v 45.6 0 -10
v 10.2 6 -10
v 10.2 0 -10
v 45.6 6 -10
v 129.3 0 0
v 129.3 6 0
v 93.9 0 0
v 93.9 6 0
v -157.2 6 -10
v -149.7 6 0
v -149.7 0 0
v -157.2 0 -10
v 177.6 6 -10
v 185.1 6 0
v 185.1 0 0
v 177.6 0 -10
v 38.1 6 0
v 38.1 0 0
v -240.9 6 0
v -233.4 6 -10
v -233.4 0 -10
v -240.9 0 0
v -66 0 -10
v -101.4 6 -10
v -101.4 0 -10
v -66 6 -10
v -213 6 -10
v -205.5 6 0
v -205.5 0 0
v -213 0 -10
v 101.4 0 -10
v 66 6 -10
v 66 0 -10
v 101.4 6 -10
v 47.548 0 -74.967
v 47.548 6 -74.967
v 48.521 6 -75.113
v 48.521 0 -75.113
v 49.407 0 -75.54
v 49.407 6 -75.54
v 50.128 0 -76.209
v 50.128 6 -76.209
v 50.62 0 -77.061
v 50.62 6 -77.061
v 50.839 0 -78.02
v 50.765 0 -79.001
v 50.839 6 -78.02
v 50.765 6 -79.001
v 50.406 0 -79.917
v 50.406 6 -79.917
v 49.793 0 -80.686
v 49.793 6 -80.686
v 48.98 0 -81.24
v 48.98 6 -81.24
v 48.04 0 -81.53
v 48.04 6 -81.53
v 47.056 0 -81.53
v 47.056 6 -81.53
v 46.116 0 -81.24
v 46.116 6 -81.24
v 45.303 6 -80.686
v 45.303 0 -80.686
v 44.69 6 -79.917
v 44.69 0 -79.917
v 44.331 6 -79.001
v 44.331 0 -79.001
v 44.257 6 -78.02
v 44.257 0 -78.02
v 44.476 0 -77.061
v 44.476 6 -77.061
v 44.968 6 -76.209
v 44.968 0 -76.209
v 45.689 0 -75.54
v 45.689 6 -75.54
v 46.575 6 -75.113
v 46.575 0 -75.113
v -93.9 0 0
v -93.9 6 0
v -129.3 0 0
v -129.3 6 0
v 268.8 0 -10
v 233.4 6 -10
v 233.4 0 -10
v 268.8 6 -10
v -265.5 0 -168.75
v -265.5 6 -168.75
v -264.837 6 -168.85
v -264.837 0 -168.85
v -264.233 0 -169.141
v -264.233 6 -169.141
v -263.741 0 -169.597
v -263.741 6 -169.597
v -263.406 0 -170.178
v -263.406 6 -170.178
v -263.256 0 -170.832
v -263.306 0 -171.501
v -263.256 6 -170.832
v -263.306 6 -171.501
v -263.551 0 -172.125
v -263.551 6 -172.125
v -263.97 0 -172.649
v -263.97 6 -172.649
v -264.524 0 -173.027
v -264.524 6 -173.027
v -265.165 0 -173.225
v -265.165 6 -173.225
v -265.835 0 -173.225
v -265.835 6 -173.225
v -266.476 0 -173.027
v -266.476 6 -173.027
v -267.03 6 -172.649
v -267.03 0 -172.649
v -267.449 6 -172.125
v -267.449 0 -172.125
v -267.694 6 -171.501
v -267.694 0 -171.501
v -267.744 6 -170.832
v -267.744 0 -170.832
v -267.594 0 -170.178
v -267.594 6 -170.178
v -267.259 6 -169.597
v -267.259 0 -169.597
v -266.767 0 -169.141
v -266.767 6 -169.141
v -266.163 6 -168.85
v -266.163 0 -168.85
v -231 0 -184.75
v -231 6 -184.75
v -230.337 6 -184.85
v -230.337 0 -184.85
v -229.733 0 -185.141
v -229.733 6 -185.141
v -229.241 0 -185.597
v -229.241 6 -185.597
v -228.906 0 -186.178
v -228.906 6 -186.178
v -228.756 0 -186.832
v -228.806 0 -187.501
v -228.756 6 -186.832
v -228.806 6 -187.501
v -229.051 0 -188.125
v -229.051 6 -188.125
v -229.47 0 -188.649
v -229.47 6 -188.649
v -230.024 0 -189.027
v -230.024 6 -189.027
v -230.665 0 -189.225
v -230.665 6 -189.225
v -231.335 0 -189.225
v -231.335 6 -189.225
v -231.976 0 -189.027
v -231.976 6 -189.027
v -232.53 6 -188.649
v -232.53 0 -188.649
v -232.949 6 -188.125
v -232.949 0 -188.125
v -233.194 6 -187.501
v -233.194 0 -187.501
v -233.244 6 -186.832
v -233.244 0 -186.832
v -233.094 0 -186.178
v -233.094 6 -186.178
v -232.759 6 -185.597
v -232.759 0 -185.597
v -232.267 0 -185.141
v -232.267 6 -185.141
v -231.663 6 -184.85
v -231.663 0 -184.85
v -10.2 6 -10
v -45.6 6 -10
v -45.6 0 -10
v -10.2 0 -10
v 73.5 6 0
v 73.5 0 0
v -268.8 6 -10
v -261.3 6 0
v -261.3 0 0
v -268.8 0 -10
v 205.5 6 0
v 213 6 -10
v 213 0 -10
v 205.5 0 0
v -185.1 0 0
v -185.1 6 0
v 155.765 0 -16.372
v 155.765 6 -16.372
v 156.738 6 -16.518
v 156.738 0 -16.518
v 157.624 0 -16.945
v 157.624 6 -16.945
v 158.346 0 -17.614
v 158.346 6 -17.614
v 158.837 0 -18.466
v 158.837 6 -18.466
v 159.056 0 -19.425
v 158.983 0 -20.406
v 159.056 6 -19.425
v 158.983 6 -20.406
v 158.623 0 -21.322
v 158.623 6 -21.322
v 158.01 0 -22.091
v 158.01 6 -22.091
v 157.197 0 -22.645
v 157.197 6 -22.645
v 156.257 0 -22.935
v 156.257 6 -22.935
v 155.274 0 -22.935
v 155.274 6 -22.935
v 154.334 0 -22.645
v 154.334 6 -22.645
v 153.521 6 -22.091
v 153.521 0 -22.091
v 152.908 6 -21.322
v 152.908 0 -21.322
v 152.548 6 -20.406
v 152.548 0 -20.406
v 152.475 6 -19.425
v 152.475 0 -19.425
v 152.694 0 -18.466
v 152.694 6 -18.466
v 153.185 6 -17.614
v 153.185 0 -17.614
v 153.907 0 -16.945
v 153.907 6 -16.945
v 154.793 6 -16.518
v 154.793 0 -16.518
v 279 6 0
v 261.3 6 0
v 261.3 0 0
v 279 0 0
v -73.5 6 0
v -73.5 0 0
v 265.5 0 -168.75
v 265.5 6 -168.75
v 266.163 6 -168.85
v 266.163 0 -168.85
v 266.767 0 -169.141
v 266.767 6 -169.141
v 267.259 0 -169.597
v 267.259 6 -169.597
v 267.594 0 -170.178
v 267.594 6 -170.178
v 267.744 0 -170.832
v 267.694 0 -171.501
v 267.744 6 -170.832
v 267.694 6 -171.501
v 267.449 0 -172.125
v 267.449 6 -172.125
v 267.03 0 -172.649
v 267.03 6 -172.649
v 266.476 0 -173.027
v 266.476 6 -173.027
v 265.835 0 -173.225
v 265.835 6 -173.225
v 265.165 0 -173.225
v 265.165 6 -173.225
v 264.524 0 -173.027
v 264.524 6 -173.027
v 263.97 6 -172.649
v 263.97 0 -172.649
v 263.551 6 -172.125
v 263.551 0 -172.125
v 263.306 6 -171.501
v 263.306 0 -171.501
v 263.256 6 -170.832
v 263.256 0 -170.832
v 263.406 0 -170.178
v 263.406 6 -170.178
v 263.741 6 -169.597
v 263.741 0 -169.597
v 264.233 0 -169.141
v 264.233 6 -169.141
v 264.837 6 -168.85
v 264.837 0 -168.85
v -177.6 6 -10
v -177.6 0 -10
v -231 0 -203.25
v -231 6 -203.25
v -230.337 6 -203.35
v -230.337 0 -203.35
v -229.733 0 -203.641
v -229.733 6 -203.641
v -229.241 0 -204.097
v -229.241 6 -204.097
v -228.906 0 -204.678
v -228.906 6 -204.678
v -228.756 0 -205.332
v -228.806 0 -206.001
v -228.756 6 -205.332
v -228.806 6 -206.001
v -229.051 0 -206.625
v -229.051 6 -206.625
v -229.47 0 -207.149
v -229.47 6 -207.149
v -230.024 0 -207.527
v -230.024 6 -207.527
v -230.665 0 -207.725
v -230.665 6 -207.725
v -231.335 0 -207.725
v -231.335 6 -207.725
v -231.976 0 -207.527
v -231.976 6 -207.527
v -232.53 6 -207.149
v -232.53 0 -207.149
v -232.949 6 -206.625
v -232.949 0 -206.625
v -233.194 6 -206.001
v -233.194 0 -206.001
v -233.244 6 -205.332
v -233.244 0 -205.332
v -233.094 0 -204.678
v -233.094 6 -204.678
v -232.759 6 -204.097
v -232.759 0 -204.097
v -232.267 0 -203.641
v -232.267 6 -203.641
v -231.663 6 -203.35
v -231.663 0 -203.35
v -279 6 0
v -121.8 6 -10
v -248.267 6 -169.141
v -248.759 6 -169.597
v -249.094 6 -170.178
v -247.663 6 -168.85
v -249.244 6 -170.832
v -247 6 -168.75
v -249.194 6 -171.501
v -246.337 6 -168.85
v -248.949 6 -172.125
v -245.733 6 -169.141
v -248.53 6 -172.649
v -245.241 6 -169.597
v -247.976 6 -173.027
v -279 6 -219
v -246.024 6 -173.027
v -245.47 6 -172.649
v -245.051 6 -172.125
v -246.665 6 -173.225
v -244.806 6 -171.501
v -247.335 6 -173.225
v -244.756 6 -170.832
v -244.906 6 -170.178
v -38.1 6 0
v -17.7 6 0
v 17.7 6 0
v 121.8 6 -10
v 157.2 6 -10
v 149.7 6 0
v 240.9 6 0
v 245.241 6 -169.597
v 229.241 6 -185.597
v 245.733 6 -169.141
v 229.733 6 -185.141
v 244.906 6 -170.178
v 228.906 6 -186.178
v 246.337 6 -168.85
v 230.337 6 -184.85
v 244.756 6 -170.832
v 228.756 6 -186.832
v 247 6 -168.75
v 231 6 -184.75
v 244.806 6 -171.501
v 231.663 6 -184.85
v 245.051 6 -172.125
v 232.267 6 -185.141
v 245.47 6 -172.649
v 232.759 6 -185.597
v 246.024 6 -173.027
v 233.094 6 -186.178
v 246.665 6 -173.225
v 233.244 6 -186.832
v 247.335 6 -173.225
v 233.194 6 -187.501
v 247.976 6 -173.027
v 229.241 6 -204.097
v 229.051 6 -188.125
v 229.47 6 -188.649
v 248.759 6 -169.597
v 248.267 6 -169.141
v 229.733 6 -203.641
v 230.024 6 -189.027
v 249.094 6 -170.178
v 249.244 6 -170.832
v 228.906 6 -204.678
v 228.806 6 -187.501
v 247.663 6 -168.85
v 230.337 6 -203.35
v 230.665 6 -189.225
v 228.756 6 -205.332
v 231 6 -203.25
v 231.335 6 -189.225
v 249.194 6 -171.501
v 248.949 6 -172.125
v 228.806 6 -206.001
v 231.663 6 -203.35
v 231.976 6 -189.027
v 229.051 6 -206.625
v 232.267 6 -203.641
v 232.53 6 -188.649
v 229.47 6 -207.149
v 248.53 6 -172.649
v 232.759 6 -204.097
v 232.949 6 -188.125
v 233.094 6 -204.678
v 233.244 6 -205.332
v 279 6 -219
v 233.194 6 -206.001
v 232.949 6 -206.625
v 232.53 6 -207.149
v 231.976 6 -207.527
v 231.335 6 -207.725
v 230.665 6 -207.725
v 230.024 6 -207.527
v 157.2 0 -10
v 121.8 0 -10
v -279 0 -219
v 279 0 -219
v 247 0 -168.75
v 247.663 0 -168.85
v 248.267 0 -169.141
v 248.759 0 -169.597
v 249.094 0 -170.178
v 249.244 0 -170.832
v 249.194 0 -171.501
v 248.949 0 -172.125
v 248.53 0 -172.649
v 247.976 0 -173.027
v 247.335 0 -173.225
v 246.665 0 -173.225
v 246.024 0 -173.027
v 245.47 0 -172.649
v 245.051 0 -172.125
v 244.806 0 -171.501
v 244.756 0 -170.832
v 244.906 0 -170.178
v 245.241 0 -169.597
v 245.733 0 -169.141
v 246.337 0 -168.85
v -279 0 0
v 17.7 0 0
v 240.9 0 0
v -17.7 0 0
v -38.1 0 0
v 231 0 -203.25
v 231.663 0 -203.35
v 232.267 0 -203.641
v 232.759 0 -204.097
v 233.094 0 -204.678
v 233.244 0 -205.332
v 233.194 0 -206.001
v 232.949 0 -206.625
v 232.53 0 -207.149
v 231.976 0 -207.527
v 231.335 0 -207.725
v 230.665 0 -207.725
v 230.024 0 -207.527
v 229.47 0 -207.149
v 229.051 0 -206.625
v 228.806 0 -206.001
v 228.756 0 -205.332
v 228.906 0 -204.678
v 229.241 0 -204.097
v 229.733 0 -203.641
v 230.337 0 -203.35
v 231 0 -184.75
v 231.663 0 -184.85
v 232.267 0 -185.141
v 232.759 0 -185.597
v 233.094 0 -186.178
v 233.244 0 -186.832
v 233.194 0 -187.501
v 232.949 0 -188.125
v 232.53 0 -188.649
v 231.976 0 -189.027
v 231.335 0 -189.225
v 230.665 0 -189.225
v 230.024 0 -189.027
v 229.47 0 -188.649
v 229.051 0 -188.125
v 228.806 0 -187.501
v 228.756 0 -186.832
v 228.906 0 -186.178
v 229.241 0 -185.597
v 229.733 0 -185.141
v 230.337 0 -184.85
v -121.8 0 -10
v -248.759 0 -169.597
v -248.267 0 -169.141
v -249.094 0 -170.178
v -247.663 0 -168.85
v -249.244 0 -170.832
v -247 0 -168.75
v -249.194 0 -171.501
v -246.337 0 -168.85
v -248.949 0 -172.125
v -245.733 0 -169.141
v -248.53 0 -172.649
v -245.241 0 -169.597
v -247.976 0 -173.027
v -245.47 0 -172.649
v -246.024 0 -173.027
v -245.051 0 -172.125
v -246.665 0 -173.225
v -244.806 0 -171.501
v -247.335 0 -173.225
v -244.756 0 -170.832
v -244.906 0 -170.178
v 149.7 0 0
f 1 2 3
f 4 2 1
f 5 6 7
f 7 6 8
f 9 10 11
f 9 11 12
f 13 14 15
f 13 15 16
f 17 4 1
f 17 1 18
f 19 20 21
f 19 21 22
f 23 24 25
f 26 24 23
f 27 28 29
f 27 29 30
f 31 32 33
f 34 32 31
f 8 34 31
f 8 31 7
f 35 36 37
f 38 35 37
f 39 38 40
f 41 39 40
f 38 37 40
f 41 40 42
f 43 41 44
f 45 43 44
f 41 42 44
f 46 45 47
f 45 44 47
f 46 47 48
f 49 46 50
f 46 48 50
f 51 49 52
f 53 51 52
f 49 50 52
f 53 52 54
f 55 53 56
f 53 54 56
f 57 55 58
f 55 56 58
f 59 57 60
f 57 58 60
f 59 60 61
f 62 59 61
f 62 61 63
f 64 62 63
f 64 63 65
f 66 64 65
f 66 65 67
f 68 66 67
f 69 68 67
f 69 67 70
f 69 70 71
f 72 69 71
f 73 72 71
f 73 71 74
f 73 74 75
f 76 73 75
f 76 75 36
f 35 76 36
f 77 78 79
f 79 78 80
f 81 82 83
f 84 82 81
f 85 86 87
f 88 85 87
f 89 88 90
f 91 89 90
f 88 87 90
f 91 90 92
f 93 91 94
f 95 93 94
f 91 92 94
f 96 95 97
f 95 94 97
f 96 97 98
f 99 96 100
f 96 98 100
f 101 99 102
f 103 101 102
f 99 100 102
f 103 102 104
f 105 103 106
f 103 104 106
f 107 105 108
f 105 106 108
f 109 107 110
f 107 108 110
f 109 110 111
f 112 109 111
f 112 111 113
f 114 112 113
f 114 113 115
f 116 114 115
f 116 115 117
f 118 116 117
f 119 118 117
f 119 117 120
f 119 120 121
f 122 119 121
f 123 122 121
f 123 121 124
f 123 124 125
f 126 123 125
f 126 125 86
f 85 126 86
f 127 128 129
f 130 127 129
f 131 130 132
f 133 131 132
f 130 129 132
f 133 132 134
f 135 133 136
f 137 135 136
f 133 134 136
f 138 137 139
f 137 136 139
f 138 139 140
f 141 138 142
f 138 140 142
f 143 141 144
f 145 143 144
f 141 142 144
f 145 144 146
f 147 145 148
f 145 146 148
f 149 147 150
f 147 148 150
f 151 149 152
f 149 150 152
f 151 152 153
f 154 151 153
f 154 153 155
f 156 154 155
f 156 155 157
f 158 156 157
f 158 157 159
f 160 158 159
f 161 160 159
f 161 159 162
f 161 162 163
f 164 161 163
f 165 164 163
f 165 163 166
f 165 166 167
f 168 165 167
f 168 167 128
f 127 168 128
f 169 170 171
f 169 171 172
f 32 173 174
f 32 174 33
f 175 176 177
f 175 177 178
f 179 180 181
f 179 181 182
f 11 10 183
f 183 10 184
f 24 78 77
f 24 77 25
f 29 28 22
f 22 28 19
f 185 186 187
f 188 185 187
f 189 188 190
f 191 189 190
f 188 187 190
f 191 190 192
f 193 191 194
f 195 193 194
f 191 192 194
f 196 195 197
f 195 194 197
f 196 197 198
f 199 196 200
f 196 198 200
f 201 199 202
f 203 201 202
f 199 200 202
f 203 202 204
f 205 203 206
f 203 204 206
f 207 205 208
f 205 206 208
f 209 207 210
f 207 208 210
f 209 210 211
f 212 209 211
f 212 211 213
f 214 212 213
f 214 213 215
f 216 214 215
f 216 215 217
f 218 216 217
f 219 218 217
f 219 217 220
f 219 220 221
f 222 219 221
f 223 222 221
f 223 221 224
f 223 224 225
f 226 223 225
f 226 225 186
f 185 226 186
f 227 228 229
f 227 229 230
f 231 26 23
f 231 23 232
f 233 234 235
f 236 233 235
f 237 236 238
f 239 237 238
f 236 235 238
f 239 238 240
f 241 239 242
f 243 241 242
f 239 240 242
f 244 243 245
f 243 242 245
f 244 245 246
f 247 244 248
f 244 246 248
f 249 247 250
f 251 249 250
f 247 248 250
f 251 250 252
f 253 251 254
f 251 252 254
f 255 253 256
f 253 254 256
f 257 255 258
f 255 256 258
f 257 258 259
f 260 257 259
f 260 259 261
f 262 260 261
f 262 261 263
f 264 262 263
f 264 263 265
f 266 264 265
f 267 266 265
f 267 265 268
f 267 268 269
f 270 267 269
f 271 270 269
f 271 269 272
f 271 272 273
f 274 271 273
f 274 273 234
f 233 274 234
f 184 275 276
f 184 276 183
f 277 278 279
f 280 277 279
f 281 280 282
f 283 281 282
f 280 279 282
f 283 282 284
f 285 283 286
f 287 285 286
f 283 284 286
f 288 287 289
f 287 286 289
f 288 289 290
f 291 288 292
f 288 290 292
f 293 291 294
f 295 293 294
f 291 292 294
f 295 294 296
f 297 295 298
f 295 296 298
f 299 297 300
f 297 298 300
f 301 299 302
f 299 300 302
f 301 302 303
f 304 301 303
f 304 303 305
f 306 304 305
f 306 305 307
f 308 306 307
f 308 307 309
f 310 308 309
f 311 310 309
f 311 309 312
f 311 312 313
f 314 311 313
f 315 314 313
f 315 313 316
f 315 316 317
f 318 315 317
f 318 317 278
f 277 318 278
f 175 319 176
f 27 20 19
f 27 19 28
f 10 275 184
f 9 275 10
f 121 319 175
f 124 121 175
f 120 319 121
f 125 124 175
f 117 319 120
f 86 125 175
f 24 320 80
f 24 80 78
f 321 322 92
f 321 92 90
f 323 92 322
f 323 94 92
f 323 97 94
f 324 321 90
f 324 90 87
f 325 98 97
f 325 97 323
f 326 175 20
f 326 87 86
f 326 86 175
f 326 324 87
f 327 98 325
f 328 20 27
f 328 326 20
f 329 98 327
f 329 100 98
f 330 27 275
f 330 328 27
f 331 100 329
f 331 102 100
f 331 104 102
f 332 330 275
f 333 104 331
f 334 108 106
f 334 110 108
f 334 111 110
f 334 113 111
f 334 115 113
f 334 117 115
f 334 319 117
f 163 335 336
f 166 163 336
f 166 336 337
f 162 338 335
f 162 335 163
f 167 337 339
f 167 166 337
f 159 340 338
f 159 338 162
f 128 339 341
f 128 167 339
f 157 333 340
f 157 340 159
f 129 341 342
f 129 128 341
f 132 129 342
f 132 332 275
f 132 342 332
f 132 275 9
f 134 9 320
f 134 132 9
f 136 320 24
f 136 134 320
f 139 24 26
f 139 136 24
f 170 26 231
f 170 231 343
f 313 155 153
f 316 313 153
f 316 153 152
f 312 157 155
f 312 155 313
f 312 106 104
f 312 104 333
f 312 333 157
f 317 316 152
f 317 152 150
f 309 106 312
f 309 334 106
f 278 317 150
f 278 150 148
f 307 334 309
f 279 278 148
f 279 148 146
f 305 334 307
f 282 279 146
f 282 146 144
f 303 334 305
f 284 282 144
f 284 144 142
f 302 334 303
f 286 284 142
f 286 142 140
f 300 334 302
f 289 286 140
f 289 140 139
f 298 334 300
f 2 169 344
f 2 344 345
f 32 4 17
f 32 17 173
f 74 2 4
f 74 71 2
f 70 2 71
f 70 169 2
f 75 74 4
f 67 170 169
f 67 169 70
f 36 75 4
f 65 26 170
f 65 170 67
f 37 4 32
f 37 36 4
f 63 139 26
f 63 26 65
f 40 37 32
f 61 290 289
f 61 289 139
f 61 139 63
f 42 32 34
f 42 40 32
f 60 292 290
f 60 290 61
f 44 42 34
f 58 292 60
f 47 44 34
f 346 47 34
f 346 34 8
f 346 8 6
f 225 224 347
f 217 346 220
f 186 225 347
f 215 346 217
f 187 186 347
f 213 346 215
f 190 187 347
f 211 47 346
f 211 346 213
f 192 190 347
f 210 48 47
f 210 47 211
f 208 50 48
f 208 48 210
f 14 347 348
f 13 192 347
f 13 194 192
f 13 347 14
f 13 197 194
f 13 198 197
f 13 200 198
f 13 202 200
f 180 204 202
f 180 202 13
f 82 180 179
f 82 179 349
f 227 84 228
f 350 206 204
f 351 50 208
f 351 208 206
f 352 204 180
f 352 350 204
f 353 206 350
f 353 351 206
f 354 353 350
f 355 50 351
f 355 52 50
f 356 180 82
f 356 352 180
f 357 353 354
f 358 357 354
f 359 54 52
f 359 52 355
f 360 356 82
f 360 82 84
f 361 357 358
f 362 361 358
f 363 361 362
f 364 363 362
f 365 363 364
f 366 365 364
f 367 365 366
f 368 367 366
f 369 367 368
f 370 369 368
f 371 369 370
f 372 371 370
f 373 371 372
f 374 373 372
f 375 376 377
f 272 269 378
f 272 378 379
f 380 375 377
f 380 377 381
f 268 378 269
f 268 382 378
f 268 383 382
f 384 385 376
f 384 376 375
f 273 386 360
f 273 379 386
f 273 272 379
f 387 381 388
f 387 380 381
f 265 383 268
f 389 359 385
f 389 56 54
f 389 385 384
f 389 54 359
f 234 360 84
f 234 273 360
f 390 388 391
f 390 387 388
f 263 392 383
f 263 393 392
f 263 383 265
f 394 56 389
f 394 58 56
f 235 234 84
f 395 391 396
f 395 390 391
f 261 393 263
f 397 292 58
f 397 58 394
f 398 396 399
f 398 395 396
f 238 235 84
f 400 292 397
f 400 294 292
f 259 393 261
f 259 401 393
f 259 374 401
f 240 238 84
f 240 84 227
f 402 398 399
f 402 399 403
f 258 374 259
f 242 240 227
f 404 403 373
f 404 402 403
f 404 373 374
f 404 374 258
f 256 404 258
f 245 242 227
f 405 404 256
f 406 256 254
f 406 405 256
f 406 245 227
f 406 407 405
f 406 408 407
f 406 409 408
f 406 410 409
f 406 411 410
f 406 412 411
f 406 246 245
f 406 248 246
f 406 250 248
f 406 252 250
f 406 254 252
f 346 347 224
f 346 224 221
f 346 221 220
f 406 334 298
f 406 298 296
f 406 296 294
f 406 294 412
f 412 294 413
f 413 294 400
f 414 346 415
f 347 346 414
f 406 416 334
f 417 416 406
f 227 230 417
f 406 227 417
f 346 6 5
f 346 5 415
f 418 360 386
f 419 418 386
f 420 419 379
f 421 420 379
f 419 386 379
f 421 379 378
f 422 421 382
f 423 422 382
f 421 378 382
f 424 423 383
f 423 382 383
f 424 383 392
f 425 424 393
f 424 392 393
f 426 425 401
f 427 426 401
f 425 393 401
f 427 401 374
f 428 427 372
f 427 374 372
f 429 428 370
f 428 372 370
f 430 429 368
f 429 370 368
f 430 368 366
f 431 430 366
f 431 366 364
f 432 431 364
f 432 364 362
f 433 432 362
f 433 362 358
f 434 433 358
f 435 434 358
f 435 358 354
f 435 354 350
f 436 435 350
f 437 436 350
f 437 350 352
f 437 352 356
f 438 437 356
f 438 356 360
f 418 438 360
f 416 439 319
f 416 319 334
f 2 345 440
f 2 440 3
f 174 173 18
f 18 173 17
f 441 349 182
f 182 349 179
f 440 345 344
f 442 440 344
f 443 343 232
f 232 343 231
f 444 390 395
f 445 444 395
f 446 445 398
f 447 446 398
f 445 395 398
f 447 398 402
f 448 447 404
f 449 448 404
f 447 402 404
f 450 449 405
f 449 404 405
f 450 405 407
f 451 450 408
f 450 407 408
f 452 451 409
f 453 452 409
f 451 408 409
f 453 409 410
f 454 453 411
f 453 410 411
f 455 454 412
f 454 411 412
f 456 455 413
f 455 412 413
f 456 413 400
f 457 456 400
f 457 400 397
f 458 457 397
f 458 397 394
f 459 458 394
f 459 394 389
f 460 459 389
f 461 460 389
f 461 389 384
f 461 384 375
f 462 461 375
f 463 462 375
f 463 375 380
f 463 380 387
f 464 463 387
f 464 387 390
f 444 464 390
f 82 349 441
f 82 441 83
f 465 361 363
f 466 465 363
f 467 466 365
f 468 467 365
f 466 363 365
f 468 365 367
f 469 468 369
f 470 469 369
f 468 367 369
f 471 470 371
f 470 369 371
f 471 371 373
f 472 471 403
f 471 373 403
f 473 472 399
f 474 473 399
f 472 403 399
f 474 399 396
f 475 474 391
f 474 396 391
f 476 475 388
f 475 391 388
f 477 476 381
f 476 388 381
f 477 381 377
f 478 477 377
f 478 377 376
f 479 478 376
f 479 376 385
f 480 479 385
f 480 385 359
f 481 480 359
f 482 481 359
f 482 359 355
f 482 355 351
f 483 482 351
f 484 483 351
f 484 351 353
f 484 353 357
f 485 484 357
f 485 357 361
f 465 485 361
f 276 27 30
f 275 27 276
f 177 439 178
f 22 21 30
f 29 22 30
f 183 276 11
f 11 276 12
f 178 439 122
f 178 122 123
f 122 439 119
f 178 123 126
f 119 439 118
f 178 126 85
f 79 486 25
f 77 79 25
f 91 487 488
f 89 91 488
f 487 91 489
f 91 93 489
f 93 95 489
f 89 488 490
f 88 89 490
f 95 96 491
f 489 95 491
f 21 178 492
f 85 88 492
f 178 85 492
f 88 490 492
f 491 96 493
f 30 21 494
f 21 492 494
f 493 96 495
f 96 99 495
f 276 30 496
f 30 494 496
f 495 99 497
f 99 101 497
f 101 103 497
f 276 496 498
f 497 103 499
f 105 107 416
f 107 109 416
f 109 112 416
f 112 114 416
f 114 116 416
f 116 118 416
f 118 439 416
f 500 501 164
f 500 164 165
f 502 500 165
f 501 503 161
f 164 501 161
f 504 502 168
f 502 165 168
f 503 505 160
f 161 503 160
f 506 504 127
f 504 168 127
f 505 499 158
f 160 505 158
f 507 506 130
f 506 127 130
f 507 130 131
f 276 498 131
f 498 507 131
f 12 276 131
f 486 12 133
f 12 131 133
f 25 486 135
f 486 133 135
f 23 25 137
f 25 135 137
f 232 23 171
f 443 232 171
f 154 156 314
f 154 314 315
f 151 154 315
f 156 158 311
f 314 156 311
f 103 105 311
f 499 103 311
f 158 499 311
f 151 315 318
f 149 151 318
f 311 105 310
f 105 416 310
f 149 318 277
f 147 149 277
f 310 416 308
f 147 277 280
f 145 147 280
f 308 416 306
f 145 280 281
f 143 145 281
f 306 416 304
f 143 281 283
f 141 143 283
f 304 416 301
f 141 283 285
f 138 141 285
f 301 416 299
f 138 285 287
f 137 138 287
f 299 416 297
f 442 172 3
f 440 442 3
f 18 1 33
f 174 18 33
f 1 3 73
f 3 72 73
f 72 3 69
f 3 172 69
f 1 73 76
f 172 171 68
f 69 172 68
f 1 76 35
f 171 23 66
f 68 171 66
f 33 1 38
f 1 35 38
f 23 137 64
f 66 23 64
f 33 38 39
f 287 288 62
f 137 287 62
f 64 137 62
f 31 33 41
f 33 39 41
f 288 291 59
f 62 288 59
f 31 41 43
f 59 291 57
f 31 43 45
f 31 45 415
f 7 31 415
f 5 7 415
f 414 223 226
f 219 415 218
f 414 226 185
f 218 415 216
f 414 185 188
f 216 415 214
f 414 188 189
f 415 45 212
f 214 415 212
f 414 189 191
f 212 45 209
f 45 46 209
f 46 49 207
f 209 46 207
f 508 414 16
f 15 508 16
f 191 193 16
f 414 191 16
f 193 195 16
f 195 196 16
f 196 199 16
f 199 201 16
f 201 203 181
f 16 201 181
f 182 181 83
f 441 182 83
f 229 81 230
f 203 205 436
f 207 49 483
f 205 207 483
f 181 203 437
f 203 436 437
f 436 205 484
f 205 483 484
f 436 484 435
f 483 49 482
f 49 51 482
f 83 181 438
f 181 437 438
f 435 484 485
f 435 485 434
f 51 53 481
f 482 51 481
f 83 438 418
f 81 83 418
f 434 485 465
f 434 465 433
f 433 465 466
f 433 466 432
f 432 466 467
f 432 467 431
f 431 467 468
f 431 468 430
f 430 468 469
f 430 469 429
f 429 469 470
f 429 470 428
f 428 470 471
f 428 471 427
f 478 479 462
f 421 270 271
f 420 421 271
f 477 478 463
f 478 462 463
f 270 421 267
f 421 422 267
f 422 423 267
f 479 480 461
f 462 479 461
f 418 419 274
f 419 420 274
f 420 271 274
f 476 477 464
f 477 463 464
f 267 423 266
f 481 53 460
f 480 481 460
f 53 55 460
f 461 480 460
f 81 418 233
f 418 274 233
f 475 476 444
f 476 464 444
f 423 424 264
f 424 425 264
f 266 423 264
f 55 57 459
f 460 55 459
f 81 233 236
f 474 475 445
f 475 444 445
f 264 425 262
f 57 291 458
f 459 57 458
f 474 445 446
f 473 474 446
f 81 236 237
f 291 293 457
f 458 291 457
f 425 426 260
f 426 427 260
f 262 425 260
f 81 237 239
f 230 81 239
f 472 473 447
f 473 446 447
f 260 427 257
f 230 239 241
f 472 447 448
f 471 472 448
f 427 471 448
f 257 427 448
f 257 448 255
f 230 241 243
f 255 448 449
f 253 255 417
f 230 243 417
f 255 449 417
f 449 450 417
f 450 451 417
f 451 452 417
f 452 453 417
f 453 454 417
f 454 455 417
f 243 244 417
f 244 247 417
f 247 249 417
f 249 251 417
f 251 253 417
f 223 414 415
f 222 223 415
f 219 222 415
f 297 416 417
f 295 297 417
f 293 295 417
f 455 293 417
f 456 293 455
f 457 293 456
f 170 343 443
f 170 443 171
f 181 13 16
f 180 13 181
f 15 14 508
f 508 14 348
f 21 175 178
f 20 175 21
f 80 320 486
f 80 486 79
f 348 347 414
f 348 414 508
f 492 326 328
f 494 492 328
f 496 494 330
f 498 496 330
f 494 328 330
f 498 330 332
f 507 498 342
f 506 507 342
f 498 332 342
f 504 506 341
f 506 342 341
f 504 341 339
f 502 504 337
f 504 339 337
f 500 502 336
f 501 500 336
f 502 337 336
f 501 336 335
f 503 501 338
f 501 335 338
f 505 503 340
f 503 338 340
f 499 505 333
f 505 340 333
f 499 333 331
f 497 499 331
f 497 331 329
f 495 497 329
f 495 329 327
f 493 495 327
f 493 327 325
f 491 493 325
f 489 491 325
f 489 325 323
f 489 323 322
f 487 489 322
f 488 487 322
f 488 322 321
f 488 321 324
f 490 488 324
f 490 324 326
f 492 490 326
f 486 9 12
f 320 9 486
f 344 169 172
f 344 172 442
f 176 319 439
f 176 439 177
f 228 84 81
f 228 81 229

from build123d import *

# Parameters (mm, degrees)
SCHIZZO1_W                   = 558
SCHIZZO1_H                   = 438
ESTRUSIONE_ESTRUSIONE1_DEPTH = 6
SCHIZZO2_R                   = 2.25
TAGLIO_ESTRUSIONE1_DEPTH     = 10
SCHIZZO4_R                   = 3.3
TAGLIO_ESTRUSIONE2_DEPTH     = 10
SCHIZZO5_R                   = 2.25
TAGLIO_ESTRUSIONE3_DEPTH     = 10
TAGLIO_ESTRUSIONE4_DEPTH     = 10


with BuildPart() as part:
    # Schizzo1 → Estrusione-Estrusione1 (new body)
    with BuildSketch(Plane(origin=(0, 0, 0), x_dir=(1, 0, 0), z_dir=(0, 1, 0))):
        Rectangle(SCHIZZO1_W, SCHIZZO1_H)
    extrude(amount=ESTRUSIONE_ESTRUSIONE1_DEPTH)

    # Schizzo2 → Taglio-Estrusione1 (cut)
    with BuildSketch(Plane(origin=(0, 6, 0), x_dir=(1, 0, 0), z_dir=(0, 1, 0))):
        with Locations(Location((-231, 205.5, 0), (0, 0, 270))):
            Circle(SCHIZZO2_R)
        with Locations(Location((-231, 187, 0), (0, 0, 270))):
            Circle(SCHIZZO2_R)
        with Locations(Location((-247, 171, 0), (0, 0, 270))):
            Circle(SCHIZZO2_R)
        with Locations(Location((-265.5, 171, 0), (0, 0, 270))):
            Circle(SCHIZZO2_R)
        with Locations(Location((231, 205.5, 0), (0, 0, 270))):
            Circle(SCHIZZO2_R)
        with Locations(Location((231, 187, 0), (0, 0, 270))):
            Circle(SCHIZZO2_R)
        with Locations(Location((247, 171, 0), (0, 0, 270))):
            Circle(SCHIZZO2_R)
        with Locations(Location((265.5, 171, 0), (0, 0, 270))):
            Circle(SCHIZZO2_R)
        with Locations(Location((265.5, -171, 0), (0, 0, 270))):
            Circle(SCHIZZO2_R)
        with Locations(Location((247, -171, 0), (0, 0, 270))):
            Circle(SCHIZZO2_R)
        with Locations(Location((231, -187, 0), (0, 0, 270))):
            Circle(SCHIZZO2_R)
        with Locations(Location((231, -205.5, 0), (0, 0, 270))):
            Circle(SCHIZZO2_R)
        with Locations(Location((-231, -205.5, 0), (0, 0, 270))):
            Circle(SCHIZZO2_R)
        with Locations(Location((-231, -187, 0), (0, 0, 270))):
            Circle(SCHIZZO2_R)
        with Locations(Location((-247, -171, 0), (0, 0, 270))):
            Circle(SCHIZZO2_R)
        with Locations(Location((-265.5, -171, 0), (0, 0, 270))):
            Circle(SCHIZZO2_R)
    extrude(amount=-TAGLIO_ESTRUSIONE1_DEPTH, mode=Mode.SUBTRACT)

    # Schizzo4 → Taglio-Estrusione2 (cut)
    with BuildSketch(Plane(origin=(0, 6, 0), x_dir=(1, 0, 0), z_dir=(0, 1, 0))):
        with Locations(Location((-11.04713937, -29.950902322, 0), (0, 0, 270))):
            Circle(SCHIZZO4_R)
        with Locations(Location((97.170402481, -88.545989873, 0), (0, 0, 270))):
            Circle(SCHIZZO4_R)
        with Locations(Location((155.765489817, 19.671552094, 0), (0, 0, 270))):
            Circle(SCHIZZO4_R)
        with Locations(Location((47.547947967, 78.266639645, 0), (0, 0, 270))):
            Circle(SCHIZZO4_R)
    extrude(amount=-TAGLIO_ESTRUSIONE2_DEPTH, mode=Mode.SUBTRACT)

    # Schizzo5 → Taglio-Estrusione3 (cut)
    with BuildSketch(Plane.XZ):
        with Locations(Location((-136.921607377, 165.135242981, 0), (0, 0, 270))):
            Circle(SCHIZZO5_R)
        with Locations(Location((-136.921607377, 145.135242981, 0), (0, 0, 270))):
            Circle(SCHIZZO5_R)
    extrude(amount=-TAGLIO_ESTRUSIONE3_DEPTH, mode=Mode.SUBTRACT)

    # Schizzo6 → Taglio-Estrusione4 (cut)
    with BuildSketch(Plane(origin=(0, 6, 0), x_dir=(1, 0, 0), z_dir=(0, 1, 0))):
        Polygon((-279, 0), (-261.3, 0), (-268.8, 10), (-233.4, 10), (-240.9, 0), (-223.2, 0), (-205.5, 0), (-213, 10), (-177.6, 10), (-185.1, 0), (-167.4, 0), (-149.7, 0), (-157.2, 10), (-121.8, 10), (-129.3, 0), (-111.6, 0), (-93.9, 0), (-101.4, 10), (-66, 10), (-73.5, 0), (-55.8, 0), (-38.1, 0), (-45.6, 10), (-10.2, 10), (-17.7, 0), (0, 0), (17.7, 0), (10.2, 10), (45.6, 10), (38.1, 0), (55.8, 0), (73.5, 0), (66, 10), (101.4, 10), (93.9, 0), (111.6, 0), (129.3, 0), (121.8, 10), (157.2, 10), (149.7, 0), (167.4, 0), (185.1, 0), (177.6, 10), (213, 10), (205.5, 0), (223.2, 0), (240.9, 0), (233.4, 10), (268.8, 10), (261.3, 0), (279, 0), (279, -219), (-279, -219), align=None)
    extrude(amount=-TAGLIO_ESTRUSIONE4_DEPTH, mode=Mode.SUBTRACT)


solid = part.part
